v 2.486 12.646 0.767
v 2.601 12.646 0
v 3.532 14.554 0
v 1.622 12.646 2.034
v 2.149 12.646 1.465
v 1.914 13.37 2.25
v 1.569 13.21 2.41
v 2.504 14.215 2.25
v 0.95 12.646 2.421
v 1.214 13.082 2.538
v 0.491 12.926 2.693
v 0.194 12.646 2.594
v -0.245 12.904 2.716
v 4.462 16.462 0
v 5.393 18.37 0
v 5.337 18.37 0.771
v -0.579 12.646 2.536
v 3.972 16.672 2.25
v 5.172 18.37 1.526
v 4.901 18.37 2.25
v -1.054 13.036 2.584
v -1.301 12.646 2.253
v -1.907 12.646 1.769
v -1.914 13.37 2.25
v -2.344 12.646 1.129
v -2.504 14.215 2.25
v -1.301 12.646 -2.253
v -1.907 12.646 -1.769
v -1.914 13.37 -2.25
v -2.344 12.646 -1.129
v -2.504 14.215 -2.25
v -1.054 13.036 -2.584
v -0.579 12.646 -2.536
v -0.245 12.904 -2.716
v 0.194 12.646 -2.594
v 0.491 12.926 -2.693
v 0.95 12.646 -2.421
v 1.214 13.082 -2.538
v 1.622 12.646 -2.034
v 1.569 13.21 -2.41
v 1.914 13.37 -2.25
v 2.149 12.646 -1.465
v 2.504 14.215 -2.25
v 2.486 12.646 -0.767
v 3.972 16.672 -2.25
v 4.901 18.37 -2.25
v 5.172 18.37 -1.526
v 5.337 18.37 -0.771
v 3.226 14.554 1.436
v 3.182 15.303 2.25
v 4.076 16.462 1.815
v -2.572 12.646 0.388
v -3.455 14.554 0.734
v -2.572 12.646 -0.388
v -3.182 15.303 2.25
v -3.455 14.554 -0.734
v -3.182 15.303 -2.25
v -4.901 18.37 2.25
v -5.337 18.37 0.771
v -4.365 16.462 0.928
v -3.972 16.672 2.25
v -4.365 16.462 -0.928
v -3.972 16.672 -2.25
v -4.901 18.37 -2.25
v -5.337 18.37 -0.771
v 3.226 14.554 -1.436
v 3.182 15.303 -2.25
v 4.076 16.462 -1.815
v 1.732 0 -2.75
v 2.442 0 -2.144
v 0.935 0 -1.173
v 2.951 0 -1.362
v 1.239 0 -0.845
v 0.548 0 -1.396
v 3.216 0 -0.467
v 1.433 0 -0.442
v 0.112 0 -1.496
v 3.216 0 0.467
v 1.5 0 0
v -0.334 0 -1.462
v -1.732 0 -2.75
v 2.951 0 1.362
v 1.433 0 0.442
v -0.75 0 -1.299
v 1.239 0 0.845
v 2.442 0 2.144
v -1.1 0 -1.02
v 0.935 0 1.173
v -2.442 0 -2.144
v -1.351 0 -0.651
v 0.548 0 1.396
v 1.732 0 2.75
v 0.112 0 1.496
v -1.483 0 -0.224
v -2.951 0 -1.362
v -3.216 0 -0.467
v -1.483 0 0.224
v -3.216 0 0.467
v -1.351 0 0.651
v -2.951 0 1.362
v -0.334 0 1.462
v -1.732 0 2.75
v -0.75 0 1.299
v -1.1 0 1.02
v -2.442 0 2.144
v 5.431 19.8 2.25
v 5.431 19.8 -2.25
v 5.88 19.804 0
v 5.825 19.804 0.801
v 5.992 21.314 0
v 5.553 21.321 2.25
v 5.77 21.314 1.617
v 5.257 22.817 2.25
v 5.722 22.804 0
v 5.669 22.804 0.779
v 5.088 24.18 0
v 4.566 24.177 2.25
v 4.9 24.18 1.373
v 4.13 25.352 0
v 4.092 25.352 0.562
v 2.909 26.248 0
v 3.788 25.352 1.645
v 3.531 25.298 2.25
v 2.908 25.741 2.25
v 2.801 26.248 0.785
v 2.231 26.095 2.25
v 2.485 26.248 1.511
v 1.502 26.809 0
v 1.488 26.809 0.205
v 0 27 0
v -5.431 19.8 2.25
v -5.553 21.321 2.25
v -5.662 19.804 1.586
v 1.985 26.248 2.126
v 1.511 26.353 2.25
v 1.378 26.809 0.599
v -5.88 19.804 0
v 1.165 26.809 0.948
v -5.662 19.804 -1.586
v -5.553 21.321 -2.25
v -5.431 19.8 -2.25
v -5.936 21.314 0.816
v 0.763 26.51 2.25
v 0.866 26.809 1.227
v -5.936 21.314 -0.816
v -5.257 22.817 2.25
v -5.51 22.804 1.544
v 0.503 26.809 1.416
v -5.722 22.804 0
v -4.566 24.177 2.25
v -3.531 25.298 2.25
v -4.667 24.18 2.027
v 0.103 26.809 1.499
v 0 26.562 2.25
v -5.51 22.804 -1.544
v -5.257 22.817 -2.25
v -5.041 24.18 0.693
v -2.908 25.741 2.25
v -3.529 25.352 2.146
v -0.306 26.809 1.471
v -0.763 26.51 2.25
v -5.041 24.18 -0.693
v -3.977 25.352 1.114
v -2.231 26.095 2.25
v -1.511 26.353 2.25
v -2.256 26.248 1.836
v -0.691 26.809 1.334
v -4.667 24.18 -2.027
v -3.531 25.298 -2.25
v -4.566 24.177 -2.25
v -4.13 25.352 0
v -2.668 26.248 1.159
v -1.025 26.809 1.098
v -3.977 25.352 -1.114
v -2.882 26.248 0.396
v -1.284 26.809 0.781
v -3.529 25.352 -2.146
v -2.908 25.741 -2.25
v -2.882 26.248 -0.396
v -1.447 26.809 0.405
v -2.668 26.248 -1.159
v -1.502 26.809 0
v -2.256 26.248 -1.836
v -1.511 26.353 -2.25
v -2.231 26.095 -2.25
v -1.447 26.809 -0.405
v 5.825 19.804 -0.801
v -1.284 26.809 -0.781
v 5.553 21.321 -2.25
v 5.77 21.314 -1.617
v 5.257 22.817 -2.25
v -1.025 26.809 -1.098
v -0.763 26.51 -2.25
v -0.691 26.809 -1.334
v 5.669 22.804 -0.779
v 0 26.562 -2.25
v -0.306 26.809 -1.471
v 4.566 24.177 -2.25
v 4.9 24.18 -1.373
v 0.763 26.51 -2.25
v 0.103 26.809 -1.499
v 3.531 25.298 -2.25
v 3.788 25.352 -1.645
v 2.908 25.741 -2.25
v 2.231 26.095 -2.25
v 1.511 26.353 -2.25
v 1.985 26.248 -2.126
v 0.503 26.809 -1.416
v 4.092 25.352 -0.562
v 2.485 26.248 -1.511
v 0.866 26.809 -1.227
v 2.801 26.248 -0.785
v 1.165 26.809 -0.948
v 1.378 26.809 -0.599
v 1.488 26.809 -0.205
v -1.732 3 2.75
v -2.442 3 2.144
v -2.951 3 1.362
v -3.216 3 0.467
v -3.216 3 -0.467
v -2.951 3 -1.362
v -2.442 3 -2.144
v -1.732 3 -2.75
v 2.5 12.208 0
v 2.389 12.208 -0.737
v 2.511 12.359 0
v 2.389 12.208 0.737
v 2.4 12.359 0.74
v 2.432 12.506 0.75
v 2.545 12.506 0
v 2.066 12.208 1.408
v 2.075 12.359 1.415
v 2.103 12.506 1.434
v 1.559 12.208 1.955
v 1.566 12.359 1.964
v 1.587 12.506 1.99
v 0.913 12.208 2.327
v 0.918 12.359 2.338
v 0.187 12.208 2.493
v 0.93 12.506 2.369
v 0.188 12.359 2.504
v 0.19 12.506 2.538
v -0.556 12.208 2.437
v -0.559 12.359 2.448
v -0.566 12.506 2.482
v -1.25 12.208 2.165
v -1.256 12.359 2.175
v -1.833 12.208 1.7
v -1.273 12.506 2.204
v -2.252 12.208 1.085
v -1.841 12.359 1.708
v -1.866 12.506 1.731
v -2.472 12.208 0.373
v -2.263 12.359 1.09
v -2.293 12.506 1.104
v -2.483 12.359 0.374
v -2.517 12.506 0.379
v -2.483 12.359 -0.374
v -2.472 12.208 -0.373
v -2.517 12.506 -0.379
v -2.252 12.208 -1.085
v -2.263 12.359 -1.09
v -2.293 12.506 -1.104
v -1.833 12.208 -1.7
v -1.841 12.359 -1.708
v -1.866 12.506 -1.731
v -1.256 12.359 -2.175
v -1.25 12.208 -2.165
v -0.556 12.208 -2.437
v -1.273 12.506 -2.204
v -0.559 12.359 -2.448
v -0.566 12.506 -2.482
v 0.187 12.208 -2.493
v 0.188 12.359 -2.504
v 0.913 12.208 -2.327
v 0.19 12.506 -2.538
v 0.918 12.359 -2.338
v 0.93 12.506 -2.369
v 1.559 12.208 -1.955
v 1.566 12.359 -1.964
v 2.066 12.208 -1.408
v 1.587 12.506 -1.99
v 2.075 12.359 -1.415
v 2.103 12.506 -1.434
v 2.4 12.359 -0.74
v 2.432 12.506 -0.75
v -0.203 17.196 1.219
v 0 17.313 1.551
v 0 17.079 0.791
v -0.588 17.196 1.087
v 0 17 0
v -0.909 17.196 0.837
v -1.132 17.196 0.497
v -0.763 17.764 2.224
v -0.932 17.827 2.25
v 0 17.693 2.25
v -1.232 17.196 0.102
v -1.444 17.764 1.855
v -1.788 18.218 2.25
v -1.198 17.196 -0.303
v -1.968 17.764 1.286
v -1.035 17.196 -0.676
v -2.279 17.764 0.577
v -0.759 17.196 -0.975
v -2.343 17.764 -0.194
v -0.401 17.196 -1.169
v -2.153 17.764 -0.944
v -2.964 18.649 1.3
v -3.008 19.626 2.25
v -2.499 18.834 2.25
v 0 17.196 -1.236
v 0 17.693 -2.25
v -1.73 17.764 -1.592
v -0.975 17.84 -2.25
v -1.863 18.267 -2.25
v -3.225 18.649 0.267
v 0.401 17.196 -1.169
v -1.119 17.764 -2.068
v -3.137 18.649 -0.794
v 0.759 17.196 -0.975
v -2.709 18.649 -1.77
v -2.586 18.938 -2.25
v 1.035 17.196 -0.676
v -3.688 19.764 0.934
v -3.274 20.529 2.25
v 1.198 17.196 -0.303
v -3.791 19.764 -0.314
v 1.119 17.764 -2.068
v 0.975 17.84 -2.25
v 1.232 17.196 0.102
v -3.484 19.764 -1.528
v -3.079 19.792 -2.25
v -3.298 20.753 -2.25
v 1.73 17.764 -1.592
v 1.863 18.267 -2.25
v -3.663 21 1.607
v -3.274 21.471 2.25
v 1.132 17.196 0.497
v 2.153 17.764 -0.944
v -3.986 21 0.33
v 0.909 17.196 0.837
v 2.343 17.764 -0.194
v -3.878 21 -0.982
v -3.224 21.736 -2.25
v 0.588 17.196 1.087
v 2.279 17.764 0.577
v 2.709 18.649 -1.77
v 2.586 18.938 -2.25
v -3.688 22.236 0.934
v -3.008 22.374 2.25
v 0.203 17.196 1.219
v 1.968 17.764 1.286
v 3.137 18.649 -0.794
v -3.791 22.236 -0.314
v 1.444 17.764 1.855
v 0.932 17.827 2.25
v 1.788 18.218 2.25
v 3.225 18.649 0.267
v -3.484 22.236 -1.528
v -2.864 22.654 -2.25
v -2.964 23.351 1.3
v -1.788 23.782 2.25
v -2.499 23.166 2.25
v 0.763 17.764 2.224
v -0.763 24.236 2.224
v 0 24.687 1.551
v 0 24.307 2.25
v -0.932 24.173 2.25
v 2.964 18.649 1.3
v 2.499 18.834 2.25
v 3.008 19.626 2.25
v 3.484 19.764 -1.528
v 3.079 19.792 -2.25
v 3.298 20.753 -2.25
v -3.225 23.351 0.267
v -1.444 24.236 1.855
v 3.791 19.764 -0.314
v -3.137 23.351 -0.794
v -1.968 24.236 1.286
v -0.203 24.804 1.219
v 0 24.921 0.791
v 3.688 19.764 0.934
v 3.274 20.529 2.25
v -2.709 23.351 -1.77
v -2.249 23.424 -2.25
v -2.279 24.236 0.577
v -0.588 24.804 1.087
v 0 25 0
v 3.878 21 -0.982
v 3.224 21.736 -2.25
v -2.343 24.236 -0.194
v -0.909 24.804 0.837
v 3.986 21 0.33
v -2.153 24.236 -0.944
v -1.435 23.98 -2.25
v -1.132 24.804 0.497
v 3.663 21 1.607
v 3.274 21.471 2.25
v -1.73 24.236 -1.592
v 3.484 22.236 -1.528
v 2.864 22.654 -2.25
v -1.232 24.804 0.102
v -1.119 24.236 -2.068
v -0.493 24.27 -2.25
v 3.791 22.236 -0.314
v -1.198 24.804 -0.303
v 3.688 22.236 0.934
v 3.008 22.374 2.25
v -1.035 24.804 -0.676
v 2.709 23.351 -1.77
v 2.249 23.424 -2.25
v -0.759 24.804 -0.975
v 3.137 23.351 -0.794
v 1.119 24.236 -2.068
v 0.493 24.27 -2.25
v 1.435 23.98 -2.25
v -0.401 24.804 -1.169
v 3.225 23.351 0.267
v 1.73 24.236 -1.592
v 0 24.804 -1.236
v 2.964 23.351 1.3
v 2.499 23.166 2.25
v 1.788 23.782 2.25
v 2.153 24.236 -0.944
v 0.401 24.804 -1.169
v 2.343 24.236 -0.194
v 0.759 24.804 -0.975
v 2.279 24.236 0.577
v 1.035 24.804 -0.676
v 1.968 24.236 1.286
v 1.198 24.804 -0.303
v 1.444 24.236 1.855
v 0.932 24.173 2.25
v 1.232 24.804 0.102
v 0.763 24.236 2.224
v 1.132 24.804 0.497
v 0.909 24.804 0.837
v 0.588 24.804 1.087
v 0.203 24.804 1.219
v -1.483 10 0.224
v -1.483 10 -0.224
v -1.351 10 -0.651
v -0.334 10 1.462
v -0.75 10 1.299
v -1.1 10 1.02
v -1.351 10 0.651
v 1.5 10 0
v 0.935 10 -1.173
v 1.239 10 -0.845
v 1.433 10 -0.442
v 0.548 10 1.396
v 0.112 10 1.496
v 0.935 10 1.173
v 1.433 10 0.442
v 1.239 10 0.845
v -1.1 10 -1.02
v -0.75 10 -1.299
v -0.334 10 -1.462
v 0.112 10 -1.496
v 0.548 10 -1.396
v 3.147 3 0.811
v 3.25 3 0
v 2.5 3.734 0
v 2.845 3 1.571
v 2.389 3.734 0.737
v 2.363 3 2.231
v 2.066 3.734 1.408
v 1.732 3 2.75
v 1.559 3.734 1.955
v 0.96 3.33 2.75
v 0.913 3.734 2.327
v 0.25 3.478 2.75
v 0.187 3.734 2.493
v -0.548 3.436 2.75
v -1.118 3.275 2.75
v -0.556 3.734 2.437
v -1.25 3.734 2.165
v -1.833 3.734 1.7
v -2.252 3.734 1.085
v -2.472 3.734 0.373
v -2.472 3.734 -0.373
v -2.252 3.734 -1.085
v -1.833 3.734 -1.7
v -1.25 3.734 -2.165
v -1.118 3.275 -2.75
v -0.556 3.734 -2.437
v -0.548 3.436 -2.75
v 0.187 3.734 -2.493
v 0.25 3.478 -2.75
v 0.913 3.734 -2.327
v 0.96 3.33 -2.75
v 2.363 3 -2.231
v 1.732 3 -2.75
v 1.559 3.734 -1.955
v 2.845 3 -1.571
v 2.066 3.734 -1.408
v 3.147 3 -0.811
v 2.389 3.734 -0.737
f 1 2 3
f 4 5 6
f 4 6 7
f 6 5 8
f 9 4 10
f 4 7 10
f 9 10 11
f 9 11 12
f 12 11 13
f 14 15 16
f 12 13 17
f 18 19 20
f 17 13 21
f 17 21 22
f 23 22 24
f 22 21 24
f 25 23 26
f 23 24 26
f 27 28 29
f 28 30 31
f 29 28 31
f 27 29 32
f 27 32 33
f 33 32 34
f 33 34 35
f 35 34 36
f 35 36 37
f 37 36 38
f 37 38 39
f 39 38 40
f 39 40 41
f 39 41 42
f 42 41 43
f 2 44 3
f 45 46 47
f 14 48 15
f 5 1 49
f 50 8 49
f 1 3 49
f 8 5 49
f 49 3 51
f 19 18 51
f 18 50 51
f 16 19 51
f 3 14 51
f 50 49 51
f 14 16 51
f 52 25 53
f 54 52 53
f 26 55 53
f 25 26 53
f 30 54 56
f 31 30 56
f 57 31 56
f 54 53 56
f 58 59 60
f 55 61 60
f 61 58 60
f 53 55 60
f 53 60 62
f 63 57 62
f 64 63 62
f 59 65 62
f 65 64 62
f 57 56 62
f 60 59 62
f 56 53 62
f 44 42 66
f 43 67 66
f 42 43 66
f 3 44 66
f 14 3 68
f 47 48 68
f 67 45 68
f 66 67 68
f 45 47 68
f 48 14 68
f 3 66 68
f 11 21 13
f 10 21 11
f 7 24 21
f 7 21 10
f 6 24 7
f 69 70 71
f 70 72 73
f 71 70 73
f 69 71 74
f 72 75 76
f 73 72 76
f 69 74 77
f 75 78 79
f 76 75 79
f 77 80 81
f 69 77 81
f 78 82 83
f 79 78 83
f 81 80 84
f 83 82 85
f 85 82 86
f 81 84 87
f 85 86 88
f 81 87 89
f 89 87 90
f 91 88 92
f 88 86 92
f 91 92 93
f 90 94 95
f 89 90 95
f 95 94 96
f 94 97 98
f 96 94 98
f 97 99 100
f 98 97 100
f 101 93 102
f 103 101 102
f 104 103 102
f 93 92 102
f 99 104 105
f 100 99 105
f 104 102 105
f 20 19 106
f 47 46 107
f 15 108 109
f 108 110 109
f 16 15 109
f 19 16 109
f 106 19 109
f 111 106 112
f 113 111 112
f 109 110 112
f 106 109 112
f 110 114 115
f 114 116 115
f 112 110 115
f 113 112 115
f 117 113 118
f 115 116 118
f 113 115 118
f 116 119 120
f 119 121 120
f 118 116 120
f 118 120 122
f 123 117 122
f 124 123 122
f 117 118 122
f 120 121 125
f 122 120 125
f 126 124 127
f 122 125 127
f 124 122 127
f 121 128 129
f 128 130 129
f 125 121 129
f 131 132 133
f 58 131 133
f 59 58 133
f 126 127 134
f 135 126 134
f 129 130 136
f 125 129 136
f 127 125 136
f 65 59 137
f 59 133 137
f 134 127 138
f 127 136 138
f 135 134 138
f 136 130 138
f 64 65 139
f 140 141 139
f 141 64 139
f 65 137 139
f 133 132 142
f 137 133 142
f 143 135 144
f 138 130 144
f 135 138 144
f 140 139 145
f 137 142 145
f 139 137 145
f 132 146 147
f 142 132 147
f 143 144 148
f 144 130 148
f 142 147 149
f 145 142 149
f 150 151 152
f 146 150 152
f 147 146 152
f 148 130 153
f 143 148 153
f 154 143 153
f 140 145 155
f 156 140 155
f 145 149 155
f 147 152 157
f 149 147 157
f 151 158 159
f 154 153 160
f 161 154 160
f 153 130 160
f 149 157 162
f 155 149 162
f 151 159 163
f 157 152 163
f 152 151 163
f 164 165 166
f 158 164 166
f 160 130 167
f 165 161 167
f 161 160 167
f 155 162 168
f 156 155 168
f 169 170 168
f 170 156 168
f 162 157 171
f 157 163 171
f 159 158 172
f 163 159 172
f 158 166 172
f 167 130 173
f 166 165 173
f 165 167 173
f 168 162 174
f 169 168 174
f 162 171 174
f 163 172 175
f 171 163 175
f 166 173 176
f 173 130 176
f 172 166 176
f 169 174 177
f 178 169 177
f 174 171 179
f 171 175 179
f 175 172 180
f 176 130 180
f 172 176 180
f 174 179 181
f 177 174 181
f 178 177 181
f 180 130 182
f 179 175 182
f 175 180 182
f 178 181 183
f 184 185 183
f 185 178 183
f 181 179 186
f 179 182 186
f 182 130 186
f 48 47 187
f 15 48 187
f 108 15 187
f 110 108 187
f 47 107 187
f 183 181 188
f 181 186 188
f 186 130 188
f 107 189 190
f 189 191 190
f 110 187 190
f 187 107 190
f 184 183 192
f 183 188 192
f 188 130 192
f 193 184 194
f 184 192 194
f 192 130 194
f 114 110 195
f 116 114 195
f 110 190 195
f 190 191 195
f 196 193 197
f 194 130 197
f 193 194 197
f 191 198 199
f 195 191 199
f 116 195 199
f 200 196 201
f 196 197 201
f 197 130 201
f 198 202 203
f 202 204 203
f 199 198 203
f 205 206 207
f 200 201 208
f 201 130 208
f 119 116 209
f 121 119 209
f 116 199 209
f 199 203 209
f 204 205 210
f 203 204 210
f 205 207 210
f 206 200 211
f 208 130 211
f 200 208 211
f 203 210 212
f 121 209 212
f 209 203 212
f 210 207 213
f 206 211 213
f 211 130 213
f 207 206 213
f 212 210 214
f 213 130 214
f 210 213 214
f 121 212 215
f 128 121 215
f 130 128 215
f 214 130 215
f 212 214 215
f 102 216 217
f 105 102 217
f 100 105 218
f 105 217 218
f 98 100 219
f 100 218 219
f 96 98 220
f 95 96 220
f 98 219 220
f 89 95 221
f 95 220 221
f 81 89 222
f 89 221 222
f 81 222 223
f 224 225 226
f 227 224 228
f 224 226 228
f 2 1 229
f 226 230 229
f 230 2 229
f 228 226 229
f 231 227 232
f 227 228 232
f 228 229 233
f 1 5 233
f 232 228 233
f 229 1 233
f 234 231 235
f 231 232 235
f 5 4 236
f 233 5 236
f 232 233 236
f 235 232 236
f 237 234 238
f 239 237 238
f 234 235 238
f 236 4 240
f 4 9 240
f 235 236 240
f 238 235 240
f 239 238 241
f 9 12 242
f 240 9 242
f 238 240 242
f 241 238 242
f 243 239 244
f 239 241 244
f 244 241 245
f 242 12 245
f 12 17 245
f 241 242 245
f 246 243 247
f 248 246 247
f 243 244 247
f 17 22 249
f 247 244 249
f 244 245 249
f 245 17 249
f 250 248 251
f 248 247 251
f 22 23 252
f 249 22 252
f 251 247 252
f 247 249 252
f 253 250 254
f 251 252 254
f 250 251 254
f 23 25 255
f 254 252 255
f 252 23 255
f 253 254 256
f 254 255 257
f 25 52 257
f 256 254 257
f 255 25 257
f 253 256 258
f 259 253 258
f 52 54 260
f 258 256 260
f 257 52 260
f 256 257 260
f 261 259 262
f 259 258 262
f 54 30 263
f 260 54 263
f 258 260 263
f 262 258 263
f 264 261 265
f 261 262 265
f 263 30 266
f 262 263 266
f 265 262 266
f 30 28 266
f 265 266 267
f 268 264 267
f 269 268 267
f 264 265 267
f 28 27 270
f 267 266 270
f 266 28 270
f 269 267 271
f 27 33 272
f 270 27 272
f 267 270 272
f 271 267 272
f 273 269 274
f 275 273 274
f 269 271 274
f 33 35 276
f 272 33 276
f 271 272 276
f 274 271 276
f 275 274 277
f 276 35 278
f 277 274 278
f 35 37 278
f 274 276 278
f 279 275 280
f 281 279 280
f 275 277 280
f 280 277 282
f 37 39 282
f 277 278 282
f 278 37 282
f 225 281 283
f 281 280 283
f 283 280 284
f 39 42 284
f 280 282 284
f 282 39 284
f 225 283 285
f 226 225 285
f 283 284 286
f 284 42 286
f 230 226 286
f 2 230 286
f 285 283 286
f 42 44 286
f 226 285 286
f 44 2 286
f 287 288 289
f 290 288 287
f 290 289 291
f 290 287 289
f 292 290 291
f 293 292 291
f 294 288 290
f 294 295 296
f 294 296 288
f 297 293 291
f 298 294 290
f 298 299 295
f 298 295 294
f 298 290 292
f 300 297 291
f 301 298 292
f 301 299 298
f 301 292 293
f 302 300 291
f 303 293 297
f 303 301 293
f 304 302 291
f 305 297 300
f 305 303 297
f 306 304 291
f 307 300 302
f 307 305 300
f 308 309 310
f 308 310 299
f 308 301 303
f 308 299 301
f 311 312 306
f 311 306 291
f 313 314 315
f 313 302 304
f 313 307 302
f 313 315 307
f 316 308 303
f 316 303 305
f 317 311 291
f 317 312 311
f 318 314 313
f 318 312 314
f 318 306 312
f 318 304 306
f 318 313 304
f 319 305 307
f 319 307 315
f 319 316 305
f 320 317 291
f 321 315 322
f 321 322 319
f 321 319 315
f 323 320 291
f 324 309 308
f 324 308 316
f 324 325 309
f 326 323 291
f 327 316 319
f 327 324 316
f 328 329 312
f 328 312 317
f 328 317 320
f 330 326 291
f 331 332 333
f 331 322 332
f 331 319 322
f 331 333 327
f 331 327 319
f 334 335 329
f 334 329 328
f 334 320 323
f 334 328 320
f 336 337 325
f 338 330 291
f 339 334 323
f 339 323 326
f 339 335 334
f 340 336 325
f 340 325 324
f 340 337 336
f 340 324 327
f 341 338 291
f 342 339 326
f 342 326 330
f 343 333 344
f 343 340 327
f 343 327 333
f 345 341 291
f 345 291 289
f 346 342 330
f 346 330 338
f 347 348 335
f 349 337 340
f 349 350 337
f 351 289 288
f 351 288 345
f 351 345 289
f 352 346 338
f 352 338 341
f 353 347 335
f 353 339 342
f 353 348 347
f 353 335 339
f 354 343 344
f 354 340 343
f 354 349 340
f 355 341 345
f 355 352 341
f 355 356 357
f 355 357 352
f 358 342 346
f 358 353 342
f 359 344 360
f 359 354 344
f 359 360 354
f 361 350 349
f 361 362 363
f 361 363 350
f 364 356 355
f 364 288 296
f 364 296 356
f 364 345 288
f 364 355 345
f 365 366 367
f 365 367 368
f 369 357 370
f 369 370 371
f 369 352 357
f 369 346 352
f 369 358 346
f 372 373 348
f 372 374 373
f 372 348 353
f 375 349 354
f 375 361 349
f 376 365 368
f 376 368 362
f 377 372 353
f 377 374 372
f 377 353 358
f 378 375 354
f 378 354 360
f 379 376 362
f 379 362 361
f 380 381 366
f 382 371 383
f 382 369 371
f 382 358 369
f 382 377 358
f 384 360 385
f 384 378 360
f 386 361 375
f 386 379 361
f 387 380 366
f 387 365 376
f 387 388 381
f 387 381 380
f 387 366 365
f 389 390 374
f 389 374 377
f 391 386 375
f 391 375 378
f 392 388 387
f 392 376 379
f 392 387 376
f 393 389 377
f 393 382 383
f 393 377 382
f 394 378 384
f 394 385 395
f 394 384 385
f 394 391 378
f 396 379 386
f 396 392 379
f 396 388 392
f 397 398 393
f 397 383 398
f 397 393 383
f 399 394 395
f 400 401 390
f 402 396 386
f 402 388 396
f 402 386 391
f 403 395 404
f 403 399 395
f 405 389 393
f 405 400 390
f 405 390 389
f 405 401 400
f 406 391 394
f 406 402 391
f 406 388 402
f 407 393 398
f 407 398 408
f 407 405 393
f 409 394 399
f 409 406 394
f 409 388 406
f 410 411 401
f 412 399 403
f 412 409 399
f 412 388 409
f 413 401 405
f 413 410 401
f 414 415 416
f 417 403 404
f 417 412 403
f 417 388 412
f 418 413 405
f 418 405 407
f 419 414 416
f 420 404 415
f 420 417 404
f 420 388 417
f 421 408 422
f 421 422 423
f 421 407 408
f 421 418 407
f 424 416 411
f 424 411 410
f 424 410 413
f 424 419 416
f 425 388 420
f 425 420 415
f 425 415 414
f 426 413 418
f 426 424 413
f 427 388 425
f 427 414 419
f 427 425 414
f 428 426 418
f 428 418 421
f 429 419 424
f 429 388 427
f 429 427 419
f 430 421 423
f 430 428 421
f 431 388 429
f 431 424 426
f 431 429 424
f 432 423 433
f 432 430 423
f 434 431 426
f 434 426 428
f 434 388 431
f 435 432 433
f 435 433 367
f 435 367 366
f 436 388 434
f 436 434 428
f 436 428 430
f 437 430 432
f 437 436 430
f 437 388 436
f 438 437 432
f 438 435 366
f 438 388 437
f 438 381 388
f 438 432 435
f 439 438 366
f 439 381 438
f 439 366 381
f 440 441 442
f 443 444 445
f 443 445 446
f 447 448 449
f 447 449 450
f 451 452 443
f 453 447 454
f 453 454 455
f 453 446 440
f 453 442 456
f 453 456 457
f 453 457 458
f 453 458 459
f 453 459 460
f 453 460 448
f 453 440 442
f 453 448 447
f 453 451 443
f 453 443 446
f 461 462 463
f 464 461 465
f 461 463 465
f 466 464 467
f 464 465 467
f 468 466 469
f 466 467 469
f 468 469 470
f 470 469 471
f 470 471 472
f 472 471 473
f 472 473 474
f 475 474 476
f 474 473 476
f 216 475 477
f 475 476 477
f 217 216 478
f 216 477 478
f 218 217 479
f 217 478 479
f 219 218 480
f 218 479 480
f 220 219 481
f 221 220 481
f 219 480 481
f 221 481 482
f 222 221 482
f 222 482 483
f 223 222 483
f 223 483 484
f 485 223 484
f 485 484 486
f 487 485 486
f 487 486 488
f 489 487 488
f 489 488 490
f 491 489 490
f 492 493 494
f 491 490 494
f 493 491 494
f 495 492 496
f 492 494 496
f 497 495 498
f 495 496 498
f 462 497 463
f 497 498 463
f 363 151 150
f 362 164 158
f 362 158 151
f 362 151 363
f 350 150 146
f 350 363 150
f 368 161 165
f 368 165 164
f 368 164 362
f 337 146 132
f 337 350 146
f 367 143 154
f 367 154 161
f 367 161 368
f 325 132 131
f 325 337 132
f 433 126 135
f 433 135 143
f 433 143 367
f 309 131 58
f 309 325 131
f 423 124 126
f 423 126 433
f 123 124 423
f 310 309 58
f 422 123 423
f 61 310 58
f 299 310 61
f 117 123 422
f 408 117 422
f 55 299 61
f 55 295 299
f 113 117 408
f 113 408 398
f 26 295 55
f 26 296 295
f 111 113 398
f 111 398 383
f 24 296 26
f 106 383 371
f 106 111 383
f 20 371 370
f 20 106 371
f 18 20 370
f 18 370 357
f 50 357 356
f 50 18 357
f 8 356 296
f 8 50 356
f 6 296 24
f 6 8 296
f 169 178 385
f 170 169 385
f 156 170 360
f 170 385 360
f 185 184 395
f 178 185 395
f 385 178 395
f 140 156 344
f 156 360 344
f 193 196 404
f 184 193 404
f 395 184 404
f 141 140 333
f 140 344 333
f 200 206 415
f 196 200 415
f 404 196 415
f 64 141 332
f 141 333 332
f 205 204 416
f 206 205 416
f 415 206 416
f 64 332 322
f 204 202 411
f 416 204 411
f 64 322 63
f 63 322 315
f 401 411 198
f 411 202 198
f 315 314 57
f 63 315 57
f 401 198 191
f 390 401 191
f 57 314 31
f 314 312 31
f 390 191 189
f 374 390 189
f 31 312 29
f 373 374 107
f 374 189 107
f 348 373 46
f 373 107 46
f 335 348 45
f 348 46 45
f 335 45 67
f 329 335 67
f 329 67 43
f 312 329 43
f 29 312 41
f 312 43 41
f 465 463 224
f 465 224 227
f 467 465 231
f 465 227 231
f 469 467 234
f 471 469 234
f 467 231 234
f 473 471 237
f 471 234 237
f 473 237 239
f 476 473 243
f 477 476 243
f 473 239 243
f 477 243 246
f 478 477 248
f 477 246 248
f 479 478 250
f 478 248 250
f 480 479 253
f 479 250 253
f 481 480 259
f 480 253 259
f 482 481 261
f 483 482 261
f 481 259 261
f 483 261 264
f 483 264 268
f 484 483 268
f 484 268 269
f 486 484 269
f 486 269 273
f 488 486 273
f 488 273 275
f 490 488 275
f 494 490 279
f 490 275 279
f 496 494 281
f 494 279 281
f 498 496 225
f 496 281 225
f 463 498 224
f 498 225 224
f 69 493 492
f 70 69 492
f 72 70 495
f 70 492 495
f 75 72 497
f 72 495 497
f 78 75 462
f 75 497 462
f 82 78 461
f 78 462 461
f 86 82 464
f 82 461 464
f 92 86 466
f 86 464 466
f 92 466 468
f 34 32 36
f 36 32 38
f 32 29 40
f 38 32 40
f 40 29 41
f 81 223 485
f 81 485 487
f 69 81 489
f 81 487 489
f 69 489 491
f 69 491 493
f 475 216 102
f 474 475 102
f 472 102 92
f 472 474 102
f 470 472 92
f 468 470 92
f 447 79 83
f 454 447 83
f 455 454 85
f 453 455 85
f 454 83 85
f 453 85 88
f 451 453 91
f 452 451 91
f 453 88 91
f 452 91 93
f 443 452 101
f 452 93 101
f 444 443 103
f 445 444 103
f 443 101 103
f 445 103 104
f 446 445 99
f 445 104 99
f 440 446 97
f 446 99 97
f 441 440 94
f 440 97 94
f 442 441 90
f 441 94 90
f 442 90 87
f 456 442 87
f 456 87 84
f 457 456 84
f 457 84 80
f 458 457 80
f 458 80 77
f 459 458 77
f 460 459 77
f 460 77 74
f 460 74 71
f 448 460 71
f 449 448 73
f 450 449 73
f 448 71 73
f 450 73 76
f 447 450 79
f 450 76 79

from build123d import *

# Parameters (mm, degrees)
SKETCH_5_R          = 1.5
CUT_EXTRUDE_2_DEPTH = 10
CUT_EXTRUDE_3_DEPTH = 10
SKETCH_7_W          = 6.5
SKETCH_7_H          = 3.804727479
CUT_EXTRUDE_4_DEPTH = 29.301943396


with BuildPart() as part:
    # 草图2 → 旋转3 (revolve)
    with BuildSketch(Plane.XY):
        with BuildLine():
            Line((0, 0), (0, 27))
            ThreePointArc((0, 27), (-5.088288577, 24.179515585), (-5.392764278, 18.369773119))
            Line((-5.392764278, 18.369773119), (-2.601205954, 12.646230363))
            ThreePointArc((-2.601205954, 12.646230363), (-2.525629935, 12.432810271), (-2.5, 12.207859217))
            Line((-2.5, 12.207859217), (-2.5, 3.733696482))
            Line((-2.5, 3.733696482), (-3.25, 3))
            Line((-3.25, 3), (-3.25, 0))
            Line((-3.25, 0), (0, 0))
        make_face()
    revolve(axis=Axis((0, 35.781008953, 0), (0, -1, 0)))

    # 草图3 → 切除-旋转1 (revolve, cut)
    with BuildSketch(Plane(origin=(0, 0, 0), x_dir=(0, 0, -1), z_dir=(1, 0, 0))):
        with BuildLine():
            Line((0, 25), (0, 17))
            ThreePointArc((0, 17), (-4, 21), (0, 25))
        make_face()
    revolve(axis=Axis((0, 25, 0), (0, -1, 0)), mode=Mode.SUBTRACT)

    # 草图5 → 切除-拉伸2 (cut)
    with BuildSketch(Plane.XZ):
        Circle(SKETCH_5_R)
    extrude(amount=-CUT_EXTRUDE_2_DEPTH, mode=Mode.SUBTRACT)

    # 草图6 → 切除-拉伸3 (cut, symmetric)
    with BuildSketch(Plane(origin=(0, 0, 0), x_dir=(0, 0, -1), z_dir=(1, 0, 0))):
        Polygon((2.25, 28.432363899), (2.25, 13.369773119), (10.25, 5.369773119), (10.25, 28.432363899), align=None)
    cut_extrude_3 = extrude(amount=CUT_EXTRUDE_3_DEPTH, both=True, mode=Mode.SUBTRACT)

    # 镜向1: 切除-拉伸3 across plane
    add(cut_extrude_3.mirror(Plane.XY), mode=Mode.SUBTRACT)

    # 草图7 → 切除-拉伸4 (cut, through all)
    with BuildSketch(Plane.XY.offset(2.75)):
        with Locations((0, 1.90236374)):
            Rectangle(SKETCH_7_W, SKETCH_7_H)
    cut_extrude_4 = extrude(amount=CUT_EXTRUDE_4_DEPTH, mode=Mode.SUBTRACT)

    # 镜向2: 切除-拉伸4 across plane
    add(cut_extrude_4.mirror(Plane.XY), mode=Mode.SUBTRACT)


solid = part.part
